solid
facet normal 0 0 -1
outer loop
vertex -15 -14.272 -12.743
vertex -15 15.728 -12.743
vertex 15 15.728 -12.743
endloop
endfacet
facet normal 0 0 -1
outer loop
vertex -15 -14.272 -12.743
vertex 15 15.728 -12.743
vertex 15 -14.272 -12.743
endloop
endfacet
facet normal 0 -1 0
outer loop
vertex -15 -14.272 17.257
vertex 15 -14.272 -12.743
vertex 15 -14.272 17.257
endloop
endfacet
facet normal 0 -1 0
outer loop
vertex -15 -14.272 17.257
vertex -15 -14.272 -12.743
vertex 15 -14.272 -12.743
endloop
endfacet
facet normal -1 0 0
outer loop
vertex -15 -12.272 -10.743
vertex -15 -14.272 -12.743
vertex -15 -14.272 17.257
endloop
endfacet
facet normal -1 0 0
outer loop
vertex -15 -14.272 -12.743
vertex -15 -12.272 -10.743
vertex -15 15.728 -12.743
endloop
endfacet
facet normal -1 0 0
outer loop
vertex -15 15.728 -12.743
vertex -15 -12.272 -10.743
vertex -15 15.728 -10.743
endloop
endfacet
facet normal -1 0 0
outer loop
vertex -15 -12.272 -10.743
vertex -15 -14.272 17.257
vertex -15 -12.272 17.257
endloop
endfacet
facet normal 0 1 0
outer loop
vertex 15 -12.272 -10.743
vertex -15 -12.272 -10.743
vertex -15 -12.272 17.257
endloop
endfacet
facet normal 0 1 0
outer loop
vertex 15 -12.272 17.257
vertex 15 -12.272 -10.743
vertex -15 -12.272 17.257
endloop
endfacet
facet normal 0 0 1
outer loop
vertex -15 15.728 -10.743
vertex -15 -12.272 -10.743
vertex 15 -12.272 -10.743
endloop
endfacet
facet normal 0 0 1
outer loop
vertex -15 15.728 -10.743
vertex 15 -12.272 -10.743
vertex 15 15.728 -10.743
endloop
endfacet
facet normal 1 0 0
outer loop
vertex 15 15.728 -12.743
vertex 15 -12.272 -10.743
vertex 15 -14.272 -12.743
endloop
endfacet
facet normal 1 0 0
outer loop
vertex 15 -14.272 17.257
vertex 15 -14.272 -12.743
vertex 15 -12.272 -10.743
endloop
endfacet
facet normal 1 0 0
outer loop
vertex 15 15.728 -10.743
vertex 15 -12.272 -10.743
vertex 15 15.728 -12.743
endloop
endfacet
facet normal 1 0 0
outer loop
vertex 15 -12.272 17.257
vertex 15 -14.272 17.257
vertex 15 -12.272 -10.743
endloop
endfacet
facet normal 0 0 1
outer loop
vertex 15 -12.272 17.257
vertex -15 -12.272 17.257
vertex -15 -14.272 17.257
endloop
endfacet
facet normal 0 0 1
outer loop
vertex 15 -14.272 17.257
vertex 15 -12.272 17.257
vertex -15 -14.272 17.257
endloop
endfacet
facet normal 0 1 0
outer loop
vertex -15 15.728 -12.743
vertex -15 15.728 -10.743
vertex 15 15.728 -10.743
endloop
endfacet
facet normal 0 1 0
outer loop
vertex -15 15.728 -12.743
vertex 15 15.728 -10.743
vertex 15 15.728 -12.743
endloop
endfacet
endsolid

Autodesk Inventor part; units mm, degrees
ref_plane "YZ Plane" through (0, 0, 0) normal (1, 0, 0) x (0, 1, 0)
ref_plane "XZ Plane" through (0, 0, 0) normal (0, 1, 0) x (-1, 0, 0)
ref_plane "XY Plane" through (0, 0, 0) normal (0, 0, 1) x (1, 0, 0)
sketch "Skizze1" plane through (0, 0, 0) normal (1, 0, 0) x (0, 1, 0)
  line L0 (-12.2718, -10.7427) -> (15.7282, -10.7427)
  line L1 (15.7282, -10.7427) -> (15.7282, -12.7427)
  line L2 (15.7282, -12.7427) -> (-14.2718, -12.7427)
  line L3 (-14.2718, -12.7427) -> (-14.2718, 3.7136)
  line L4 (-14.2718, -12.7427) -> (-6.9903, -12.7427)
  line L5 (-12.2718, -10.7427) -> (-12.2718, 17.2573)
  line L6 (-12.2718, 17.2573) -> (-14.2718, 17.2573)
  line L7 (-14.2718, 17.2573) -> (-14.2718, -12.7427)
  point P0 (0, 0)
  dimension "d0" = 30
  dimension "d1" = 30
  dimension "d2" = 2
  dimension "d3" = 2
extrude "Extrusion1" add sketch "Skizze1" along normal mid plane 30
properties part number "Winkel"
